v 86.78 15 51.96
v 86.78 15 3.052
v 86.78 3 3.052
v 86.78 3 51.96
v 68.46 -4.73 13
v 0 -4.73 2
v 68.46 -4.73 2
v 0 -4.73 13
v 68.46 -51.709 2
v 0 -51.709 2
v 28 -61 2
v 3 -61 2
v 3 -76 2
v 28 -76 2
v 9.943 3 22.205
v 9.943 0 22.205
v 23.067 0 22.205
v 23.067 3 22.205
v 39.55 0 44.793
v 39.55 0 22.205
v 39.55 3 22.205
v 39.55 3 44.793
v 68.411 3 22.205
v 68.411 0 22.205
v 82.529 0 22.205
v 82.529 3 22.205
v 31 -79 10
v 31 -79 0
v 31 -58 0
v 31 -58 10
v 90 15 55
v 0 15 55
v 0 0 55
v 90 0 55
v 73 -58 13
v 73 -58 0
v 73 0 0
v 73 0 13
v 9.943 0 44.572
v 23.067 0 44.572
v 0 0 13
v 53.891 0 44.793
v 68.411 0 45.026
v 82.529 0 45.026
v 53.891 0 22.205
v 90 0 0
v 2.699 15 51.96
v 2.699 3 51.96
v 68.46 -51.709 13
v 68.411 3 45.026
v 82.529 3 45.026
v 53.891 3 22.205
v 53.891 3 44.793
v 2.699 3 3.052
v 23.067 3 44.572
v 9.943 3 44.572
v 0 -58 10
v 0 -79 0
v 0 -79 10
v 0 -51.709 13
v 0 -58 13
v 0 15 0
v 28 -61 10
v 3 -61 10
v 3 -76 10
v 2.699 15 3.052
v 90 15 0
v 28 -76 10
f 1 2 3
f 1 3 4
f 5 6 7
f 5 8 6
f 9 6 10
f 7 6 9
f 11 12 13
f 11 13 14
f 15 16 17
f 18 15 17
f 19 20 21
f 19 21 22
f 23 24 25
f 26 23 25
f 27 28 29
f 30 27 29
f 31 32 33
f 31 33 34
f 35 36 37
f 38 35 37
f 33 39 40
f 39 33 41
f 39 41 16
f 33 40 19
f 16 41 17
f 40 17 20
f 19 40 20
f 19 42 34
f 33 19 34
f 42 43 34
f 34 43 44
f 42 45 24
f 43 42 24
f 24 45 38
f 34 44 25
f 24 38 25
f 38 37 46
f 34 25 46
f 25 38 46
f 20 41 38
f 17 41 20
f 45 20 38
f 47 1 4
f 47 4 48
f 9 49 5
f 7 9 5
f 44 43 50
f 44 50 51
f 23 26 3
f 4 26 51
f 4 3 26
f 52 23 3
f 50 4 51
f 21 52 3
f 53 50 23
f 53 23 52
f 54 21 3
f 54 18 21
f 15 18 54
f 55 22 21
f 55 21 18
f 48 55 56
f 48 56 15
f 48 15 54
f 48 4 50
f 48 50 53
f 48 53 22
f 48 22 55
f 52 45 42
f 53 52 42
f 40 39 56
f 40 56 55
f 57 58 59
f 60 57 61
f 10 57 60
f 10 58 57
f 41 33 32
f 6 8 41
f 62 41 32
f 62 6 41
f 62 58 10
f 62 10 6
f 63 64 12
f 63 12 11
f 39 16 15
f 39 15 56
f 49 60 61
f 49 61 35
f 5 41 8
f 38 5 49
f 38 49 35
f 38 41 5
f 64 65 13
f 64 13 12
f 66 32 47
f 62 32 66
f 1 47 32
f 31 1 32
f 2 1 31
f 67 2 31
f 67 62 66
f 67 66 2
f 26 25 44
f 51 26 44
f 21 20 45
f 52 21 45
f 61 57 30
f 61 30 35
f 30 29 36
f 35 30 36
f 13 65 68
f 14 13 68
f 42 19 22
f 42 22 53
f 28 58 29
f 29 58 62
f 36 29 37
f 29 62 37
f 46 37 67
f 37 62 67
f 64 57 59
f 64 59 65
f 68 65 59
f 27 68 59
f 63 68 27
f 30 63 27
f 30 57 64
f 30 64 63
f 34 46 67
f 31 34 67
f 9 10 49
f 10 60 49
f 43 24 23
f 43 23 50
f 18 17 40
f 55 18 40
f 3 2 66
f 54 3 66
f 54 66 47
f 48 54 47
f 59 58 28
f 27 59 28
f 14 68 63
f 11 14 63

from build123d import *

# Parameters (mm, degrees)
F0_W      = 73
F0_H      = 58
F1_DEPTH  = 13
F2_W      = 63.252263
F2_H      = 46.978496
F3_DEPTH  = 11
F4_W      = 5.207941
F4_H      = 46.978496
F5_DEPTH  = 11
F6_W      = 90
F6_H      = 15
F7_DEPTH  = 55
F8_W      = 84.081179
F8_H      = 48.908066
F9_DEPTH  = 12
F10_W     = 31
F10_H     = 21
F11_DEPTH = 10
F12_W     = 25
F12_H     = 15
F13_DEPTH = 8
F14_W     = 13.124006
F14_H     = 22.36615
F14_W_2   = 14.341504
F14_H_2   = 22.587417
F14_W_3   = 14.118343
F14_H_3   = 22.820918
F15_DEPTH = 25


with BuildPart() as f1:
    # F0 (on Top) → F1 (new body)
    with BuildSketch(Plane.XY):
        with Locations((36.5, -29)):
            Rectangle(F0_W, F0_H)
    extrude(amount=F1_DEPTH)

    # F2 (on face) → F3 (cut)
    with BuildSketch(Plane.XY.offset(13)):
        with Locations((36.834072, -28.219316)):
            Rectangle(F2_W, F2_H)
    extrude(amount=-F3_DEPTH, mode=Mode.SUBTRACT)

    # F4 (on face) → F5 (cut)
    with BuildSketch(Plane.XY.offset(13)):
        with Locations((2.60397, -28.219316)):
            Rectangle(F4_W, F4_H)
    extrude(amount=-F5_DEPTH, mode=Mode.SUBTRACT)

    # F6 (on Top) → F7 (join)
    with BuildSketch(Plane.XY):
        with Locations((45, 7.5)):
            Rectangle(F6_W, F6_H)
    extrude(amount=F7_DEPTH)

    # F8 (on face) → F9 (cut)
    with BuildSketch(Plane(origin=(0, 15, 0), x_dir=(-1, 0, 0), z_dir=(0, 1, 0))):
        with Locations((-44.739444, 27.506275)):
            Rectangle(F8_W, F8_H)
    extrude(amount=-F9_DEPTH, mode=Mode.SUBTRACT)

    # F10 (on Top) → F11 (join)
    with BuildSketch(Plane.XY):
        with Locations((15.5, -68.5)):
            Rectangle(F10_W, F10_H)
    extrude(amount=F11_DEPTH)

    # F12 (on face) → F13 (cut)
    with BuildSketch(Plane.XY.offset(10)):
        with Locations((15.5, -68.5)):
            Rectangle(F12_W, F12_H)
    extrude(amount=-F13_DEPTH, mode=Mode.SUBTRACT)

    # F14 (on face) → F15 (cut)
    with BuildSketch(Plane.XZ):
        with Locations((16.504721, 33.388489)):
            Rectangle(F14_W, F14_H)
        with Locations((46.720475, 33.499122)):
            Rectangle(F14_W_2, F14_H_2)
        with Locations((75.470149, 33.615873)):
            Rectangle(F14_W_3, F14_H_3)
    extrude(amount=-F15_DEPTH, mode=Mode.SUBTRACT)


solid = f1.part
